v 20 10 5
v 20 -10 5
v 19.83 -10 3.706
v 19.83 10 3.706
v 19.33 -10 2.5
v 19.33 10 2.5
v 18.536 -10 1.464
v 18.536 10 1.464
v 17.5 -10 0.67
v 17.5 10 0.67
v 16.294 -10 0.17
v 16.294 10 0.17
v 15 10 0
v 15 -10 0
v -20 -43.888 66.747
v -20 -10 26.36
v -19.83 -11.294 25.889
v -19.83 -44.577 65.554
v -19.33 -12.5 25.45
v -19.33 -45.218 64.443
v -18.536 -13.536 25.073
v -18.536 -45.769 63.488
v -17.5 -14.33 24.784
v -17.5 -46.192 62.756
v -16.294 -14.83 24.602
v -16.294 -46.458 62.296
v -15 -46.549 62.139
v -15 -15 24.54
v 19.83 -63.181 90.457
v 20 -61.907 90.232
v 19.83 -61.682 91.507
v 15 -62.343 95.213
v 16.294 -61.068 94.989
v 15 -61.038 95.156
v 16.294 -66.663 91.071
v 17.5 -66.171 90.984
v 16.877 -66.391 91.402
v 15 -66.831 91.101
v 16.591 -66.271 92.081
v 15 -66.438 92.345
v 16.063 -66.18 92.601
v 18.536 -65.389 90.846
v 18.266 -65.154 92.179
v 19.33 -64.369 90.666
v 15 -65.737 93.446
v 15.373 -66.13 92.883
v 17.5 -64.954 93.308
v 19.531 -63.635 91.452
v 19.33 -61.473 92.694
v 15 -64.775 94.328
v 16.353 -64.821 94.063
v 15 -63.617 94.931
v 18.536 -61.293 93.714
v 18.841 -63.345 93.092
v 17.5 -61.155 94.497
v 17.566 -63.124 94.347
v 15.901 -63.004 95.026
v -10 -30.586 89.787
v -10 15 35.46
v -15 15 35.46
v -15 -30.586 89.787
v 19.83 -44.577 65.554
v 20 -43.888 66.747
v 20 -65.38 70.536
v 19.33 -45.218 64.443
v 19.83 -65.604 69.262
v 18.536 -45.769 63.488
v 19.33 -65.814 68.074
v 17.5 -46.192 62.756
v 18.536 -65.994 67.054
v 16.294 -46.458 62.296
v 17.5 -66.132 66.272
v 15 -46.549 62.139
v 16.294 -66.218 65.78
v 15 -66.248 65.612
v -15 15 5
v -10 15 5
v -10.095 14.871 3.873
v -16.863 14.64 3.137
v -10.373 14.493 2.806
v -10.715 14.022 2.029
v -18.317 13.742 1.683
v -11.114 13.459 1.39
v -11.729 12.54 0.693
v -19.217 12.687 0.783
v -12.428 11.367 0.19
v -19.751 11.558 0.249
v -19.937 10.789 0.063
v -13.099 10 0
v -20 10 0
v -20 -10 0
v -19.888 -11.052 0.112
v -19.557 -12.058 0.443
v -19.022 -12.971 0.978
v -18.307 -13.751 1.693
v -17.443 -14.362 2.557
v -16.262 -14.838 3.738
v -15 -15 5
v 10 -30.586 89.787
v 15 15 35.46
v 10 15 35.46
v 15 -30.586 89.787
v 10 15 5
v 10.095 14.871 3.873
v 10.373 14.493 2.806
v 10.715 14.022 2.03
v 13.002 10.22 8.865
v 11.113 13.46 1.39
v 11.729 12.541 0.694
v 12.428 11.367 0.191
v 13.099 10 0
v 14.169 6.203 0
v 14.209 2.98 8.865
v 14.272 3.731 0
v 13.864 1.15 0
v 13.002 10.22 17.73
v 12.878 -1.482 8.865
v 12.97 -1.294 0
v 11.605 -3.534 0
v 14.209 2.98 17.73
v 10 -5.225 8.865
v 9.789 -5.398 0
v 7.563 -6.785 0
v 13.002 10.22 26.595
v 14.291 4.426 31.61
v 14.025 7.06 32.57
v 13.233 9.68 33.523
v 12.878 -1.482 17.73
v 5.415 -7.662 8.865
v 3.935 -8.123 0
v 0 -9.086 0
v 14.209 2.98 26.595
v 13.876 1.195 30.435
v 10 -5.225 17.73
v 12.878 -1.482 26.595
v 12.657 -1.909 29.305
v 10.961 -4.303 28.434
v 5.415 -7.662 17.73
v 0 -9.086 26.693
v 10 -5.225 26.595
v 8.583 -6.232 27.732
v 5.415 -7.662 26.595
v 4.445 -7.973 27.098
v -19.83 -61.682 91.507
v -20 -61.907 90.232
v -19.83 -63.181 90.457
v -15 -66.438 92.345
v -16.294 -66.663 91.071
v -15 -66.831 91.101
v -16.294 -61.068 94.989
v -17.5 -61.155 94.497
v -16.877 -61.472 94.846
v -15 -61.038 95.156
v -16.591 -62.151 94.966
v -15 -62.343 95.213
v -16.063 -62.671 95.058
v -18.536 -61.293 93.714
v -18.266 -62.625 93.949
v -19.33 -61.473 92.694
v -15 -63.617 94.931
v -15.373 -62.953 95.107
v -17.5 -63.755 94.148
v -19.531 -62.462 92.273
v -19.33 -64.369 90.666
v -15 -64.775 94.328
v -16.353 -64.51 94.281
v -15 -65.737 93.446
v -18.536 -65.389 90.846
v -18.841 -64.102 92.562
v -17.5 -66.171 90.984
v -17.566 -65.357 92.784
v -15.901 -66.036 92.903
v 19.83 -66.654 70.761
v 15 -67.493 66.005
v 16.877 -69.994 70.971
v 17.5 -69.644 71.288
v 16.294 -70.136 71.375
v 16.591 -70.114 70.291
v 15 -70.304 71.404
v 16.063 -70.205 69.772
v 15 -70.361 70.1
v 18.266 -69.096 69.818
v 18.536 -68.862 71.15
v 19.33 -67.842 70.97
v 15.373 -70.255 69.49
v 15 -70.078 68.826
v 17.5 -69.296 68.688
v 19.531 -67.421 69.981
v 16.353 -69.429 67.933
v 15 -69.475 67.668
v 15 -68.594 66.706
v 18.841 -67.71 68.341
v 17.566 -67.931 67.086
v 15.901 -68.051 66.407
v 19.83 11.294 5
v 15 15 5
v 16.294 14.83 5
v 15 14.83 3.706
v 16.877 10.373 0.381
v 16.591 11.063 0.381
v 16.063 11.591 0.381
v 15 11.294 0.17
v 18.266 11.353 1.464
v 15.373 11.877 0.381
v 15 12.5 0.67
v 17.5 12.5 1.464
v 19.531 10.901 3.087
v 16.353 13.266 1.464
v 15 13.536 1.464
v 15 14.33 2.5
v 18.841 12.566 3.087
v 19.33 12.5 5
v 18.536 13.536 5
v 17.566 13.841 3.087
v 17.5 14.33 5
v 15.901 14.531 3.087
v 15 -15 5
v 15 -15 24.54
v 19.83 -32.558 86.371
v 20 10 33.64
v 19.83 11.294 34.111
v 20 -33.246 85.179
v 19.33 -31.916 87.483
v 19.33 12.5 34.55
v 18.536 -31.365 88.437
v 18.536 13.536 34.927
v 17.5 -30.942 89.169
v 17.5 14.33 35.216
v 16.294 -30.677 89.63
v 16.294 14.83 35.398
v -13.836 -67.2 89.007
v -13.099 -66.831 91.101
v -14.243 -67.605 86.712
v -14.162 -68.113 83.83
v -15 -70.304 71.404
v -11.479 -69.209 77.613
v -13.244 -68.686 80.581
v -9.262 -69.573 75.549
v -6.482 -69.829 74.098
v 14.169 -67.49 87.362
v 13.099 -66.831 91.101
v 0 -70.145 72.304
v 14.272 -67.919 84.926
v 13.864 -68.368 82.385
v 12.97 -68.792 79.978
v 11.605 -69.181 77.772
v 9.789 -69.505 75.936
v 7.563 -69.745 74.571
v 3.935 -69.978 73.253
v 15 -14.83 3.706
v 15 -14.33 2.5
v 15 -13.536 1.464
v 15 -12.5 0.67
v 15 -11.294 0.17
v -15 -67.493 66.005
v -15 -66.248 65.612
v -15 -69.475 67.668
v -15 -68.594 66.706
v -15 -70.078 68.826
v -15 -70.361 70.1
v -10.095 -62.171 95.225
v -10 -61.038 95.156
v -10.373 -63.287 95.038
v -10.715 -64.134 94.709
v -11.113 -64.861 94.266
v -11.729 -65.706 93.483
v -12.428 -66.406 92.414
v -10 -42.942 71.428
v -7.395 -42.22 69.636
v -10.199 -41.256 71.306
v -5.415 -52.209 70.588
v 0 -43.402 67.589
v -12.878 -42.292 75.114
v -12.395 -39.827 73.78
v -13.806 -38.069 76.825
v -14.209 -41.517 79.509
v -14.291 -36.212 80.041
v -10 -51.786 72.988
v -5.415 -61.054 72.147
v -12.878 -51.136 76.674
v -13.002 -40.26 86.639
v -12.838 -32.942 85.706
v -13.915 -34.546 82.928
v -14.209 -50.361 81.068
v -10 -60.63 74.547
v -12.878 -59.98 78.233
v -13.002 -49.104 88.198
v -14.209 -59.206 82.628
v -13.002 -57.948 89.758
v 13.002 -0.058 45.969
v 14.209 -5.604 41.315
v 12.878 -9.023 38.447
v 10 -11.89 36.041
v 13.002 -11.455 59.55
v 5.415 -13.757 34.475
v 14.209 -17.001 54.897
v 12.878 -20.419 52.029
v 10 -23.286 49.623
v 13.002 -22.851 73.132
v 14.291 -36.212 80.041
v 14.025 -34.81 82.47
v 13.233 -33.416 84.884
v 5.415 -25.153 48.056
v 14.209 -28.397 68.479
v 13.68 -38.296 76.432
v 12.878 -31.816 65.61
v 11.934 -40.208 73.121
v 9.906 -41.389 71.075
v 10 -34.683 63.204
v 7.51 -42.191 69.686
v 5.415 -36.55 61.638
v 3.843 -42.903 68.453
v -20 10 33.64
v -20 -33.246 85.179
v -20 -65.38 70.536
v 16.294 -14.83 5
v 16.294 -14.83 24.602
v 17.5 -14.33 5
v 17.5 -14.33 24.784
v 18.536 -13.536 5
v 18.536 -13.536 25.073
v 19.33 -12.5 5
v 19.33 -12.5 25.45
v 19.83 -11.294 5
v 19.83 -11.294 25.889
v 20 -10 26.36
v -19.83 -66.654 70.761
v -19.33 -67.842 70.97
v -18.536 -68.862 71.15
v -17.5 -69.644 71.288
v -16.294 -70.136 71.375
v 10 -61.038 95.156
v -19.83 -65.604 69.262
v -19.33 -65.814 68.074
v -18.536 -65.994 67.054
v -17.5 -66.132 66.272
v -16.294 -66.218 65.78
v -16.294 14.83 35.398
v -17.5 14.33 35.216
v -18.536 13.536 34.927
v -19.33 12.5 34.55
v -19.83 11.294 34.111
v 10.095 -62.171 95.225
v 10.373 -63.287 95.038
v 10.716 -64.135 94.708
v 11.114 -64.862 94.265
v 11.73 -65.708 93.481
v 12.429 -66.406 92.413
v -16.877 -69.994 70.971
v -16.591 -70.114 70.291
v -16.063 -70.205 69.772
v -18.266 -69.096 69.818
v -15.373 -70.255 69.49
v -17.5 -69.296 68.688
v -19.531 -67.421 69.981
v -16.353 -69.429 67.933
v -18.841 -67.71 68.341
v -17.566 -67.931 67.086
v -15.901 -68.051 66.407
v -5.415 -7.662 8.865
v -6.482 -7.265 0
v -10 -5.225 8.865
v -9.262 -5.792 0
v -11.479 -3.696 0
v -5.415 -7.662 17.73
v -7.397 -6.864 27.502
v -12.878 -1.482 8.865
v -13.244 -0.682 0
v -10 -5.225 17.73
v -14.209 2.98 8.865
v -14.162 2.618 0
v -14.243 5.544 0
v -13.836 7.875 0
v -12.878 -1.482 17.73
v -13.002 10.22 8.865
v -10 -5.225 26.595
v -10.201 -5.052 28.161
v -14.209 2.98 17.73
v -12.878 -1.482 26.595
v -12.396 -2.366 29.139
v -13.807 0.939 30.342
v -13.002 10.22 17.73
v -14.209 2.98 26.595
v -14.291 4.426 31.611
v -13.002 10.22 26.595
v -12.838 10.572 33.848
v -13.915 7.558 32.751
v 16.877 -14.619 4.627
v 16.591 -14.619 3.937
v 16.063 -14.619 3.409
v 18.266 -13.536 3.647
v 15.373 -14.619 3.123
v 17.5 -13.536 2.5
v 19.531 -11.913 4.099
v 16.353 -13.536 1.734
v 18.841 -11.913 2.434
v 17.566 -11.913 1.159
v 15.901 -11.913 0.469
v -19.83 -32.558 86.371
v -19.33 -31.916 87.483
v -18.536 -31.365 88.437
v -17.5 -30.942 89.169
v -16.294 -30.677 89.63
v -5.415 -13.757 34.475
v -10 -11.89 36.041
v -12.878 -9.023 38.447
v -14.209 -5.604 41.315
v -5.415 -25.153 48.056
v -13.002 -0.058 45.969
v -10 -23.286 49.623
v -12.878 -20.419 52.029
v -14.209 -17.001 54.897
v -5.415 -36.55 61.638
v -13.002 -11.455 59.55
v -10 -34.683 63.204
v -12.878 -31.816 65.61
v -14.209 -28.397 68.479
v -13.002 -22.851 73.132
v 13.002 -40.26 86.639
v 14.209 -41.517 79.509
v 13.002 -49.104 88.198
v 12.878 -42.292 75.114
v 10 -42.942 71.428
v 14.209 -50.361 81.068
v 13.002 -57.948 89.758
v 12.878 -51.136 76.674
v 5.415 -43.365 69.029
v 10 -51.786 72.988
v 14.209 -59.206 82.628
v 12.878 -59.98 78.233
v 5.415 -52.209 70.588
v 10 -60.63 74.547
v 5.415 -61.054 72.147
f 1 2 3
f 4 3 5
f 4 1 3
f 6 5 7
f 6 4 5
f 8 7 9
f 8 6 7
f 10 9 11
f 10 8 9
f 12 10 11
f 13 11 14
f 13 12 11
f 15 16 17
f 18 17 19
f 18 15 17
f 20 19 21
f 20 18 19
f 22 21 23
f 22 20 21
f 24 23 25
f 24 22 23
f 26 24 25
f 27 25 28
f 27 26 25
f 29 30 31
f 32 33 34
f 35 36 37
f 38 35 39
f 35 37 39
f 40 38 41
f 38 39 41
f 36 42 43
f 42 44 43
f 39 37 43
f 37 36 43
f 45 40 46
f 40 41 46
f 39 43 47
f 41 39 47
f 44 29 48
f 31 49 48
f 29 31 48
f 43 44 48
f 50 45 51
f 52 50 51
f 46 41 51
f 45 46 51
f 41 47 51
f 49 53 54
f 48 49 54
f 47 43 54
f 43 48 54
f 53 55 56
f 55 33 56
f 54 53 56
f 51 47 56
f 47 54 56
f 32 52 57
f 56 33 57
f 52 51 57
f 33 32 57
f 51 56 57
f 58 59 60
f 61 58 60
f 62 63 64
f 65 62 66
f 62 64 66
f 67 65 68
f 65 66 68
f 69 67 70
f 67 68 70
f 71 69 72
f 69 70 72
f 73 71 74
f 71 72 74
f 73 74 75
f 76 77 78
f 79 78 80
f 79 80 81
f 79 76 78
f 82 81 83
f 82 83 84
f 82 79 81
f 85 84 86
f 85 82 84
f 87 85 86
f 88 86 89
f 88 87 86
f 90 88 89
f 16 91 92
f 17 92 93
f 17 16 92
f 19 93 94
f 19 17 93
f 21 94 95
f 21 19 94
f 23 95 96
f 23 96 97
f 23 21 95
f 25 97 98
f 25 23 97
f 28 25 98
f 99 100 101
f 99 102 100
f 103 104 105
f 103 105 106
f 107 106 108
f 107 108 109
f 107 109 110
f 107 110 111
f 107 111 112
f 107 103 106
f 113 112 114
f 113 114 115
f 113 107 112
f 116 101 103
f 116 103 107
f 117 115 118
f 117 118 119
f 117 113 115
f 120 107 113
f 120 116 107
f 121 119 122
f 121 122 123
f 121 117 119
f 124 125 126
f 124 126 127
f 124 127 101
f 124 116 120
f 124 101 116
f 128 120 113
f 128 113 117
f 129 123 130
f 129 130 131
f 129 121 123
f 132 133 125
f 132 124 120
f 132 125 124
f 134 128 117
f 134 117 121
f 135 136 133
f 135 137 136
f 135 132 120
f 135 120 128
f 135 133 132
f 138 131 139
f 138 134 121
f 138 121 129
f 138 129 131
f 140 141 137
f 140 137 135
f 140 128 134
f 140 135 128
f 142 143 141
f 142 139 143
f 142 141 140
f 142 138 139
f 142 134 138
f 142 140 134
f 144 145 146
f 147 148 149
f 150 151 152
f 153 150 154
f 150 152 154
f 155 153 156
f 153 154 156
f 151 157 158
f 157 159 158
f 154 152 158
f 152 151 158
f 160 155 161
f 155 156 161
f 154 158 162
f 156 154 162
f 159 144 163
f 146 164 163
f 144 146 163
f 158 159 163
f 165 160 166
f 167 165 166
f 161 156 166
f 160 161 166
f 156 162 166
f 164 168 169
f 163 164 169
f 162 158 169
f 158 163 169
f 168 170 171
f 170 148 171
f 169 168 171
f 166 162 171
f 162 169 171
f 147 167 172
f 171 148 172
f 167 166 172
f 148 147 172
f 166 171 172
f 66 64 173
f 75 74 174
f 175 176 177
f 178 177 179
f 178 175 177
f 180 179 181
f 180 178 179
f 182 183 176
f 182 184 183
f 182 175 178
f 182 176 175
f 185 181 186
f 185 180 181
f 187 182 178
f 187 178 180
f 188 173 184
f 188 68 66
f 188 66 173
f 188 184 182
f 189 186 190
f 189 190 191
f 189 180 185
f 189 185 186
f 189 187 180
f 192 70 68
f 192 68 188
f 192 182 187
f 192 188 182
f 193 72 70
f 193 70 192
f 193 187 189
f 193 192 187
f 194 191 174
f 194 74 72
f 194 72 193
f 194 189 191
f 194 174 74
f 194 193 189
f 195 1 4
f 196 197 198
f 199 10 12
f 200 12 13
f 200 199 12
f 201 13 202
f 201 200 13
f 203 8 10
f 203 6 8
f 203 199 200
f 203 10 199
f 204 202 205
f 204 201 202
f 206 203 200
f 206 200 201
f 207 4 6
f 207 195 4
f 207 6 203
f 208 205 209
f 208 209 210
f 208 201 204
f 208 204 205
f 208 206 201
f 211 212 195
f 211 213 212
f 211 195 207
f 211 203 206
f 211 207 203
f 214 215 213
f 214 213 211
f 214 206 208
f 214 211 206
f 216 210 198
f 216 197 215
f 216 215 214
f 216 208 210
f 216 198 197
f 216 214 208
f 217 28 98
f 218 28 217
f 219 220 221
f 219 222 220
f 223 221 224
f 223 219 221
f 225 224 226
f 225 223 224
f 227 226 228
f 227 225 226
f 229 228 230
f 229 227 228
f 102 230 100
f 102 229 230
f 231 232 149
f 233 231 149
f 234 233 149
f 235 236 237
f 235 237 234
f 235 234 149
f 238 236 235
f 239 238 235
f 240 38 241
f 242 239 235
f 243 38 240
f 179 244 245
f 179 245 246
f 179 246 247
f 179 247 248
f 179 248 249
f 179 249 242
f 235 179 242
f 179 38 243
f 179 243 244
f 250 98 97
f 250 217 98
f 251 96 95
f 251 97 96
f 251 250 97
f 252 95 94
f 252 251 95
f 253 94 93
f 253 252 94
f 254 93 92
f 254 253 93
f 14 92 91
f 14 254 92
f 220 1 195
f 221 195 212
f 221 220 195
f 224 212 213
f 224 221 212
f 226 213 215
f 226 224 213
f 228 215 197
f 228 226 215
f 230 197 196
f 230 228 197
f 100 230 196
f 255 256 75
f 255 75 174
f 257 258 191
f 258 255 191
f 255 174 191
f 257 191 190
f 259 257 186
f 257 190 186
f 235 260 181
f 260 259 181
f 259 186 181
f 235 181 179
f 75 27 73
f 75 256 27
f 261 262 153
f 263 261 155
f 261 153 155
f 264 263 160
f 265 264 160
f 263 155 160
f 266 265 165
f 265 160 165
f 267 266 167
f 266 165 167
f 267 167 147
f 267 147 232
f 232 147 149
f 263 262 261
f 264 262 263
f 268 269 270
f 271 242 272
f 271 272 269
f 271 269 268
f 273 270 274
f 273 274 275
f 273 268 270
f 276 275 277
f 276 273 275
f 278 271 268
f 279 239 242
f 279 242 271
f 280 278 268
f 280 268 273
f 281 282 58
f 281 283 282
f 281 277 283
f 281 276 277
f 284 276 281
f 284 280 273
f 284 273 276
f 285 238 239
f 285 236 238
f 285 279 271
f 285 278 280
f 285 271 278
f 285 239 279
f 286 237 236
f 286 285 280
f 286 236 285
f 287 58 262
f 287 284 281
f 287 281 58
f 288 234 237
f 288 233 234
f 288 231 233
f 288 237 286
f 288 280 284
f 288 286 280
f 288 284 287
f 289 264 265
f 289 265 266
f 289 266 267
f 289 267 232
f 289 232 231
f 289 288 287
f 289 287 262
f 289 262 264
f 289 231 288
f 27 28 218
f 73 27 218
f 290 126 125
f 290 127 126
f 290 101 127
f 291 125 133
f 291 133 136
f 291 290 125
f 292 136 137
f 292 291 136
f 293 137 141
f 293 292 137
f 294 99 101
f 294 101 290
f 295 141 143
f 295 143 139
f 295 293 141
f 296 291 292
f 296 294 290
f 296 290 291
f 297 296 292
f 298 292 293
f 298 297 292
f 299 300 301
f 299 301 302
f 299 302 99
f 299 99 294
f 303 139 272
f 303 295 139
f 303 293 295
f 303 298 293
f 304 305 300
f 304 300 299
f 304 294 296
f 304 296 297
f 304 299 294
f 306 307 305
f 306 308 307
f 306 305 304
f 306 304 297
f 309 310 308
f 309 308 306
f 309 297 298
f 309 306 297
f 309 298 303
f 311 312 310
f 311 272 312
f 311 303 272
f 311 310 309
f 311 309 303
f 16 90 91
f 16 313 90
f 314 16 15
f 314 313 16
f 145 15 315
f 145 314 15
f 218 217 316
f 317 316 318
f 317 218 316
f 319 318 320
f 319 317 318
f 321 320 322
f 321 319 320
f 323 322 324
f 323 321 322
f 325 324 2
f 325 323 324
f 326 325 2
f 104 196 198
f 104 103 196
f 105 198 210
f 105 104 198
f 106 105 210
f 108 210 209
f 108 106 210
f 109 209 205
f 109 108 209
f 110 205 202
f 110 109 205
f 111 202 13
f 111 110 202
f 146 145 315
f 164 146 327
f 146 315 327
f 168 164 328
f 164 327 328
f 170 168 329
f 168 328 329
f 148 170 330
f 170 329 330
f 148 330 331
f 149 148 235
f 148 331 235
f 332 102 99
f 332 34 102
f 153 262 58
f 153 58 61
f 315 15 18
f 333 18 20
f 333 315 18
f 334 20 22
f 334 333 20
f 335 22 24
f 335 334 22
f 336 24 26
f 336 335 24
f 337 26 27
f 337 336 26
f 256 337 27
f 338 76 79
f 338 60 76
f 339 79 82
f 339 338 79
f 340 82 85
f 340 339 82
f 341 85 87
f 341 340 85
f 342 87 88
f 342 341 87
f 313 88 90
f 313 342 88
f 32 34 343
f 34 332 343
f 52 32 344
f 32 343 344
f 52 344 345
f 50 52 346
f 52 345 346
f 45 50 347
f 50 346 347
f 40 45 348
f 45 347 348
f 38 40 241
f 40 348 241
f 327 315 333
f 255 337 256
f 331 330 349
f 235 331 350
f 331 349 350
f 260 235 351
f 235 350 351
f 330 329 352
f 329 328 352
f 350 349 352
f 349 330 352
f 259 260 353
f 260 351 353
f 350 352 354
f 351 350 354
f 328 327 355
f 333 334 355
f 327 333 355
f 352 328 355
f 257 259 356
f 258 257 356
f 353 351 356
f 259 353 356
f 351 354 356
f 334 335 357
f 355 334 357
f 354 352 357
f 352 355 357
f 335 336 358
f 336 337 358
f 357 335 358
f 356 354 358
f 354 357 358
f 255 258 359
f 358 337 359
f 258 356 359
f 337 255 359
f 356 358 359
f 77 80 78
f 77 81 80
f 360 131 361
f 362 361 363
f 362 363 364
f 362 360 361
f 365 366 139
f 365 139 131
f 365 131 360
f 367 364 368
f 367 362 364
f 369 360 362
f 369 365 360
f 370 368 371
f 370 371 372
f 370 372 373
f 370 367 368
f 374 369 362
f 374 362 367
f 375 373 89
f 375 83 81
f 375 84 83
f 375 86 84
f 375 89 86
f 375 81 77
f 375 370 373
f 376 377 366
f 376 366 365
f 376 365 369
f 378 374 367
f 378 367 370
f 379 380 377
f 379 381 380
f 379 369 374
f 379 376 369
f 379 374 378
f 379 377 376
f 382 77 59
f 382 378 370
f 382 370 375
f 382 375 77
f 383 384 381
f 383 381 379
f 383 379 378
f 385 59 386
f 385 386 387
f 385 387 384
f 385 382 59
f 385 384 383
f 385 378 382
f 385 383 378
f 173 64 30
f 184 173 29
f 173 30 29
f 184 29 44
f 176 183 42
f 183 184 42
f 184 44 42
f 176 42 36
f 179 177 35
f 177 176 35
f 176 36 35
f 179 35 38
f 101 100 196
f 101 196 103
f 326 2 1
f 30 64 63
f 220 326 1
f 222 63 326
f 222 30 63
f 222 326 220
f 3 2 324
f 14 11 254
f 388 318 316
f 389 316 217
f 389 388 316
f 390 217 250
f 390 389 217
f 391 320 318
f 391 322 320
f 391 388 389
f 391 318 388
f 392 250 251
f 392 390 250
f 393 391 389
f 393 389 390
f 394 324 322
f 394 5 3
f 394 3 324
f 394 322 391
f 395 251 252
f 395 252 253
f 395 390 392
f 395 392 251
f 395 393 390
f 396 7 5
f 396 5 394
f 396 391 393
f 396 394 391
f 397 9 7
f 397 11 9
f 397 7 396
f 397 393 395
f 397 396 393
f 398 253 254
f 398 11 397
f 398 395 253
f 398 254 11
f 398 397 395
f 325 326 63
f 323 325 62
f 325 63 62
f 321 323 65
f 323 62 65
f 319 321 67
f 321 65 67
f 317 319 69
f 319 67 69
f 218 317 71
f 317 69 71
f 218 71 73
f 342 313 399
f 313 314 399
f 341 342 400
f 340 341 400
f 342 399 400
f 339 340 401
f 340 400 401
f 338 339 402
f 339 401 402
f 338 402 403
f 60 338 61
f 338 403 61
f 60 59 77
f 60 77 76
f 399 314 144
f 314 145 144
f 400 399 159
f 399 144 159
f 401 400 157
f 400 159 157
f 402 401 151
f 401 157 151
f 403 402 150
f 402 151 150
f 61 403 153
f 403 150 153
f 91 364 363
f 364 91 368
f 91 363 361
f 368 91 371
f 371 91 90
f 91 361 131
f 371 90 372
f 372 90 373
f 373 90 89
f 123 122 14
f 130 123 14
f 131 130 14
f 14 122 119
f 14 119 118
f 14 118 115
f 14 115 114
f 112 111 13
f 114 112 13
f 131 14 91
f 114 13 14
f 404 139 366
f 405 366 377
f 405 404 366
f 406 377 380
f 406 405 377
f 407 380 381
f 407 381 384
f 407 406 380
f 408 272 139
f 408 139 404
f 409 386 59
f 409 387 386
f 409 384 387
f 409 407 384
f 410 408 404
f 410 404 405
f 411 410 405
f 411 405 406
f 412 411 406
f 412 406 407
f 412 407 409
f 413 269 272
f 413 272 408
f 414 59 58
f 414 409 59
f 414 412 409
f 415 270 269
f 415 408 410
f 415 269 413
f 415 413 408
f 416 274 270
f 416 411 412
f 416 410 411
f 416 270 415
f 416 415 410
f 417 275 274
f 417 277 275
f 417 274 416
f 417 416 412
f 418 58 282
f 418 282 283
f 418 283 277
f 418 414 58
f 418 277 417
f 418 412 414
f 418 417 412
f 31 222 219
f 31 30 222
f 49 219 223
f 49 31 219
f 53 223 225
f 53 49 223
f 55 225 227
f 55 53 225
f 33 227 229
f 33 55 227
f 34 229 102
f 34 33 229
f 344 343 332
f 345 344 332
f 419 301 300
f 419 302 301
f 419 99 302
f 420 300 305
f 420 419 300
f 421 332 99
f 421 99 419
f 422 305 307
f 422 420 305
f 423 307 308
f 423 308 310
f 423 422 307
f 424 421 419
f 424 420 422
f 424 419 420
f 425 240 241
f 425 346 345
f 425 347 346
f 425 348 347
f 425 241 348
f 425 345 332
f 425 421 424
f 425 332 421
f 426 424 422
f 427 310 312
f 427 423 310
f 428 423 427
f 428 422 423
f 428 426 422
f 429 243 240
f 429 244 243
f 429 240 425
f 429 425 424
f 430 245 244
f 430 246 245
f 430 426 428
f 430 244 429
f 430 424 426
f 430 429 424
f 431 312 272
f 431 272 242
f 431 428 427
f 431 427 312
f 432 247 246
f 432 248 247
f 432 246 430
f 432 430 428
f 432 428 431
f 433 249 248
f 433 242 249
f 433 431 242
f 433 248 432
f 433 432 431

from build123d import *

# Parameters (mm, degrees)
F3_R = 5


with BuildPart() as f2:
    # F2: sweep along a path in F1
    with BuildLine(Plane.YZ) as f2_path:
        Line((0, 0), (0, 30))
        Line((0, 30), (-38.5672565812, 75.9626665871))
        Line((-38.5672565812, 75.9626665871), (-68.5672565812, 81.2524760084))
    # F0 (on Top) → F2 (sweep)
    with BuildSketch(Plane.XY):
        with BuildLine():
            Line((-10, 15), (-20, 15))
            Line((-20, 15), (-20, -15))
            Line((-20, -15), (20, -15))
            Line((20, -15), (20, 15))
            Line((20, 15), (10, 15))
            add(Edge.make_bspline(
                [(10, 15), (11.0915185913, 13.5177812127), (13.4276997431, 10.3453830316), (15.1647077967, 2.8381597184), (10.8372280842, -6.6356174494), (3.701873231, -8.2492537512), (0, -9.0864198282)],
                knots=[0, 0, 0, 0, 0.2084843189, 0.4462197347, 0.7126948299, 1, 1, 1, 1], degree=3))
            add(Edge.make_bspline(
                [(-10, 15), (-11.0915185913, 13.5177812127), (-13.4276997431, 10.3453830316), (-15.1647077967, 2.8381597184), (-10.8372280842, -6.6356174494), (-3.701873231, -8.2492537512), (0, -9.0864198282)],
                knots=[0, 0, 0, 0, 0.2084843189, 0.4462197347, 0.7126948299, 1, 1, 1, 1], degree=3))
        make_face()
    sweep(path=f2_path.line, transition=Transition.RIGHT)

    # F3
    f3_edges = [f2.edges().sort_by_distance(p)[0] for p in [
        (-20, -7.792962, 62.623147),
        (-20, 15, 17.729777),
        (-20, -15, 12.270223),
        (-20, -30.774295, 43.339519),
        (-20, -58.860285, 64.309476),
        (-20, -68.567257, 81.252476),
        (-20, -48.274229, 92.905667),
        (20, -7.792962, 62.623147),
        (20, 15, 17.729777),
        (20, -48.274229, 92.905667),
        (20, 0, 0),
        (20, -15, 12.270223),
        (20, -30.774295, 43.339519),
        (20, -58.860285, 64.309476),
        (20, -68.567257, 81.252476),
        (15, -65.962534, 96.024592),
        (-15, -65.962534, 96.024592),
        (0, -71.171979, 66.48036),
        (0, -15, 0),
        (-15, 15, 0),
        (15, 15, 0),
    ]]
    fillet(f3_edges, radius=F3_R)


solid = f2.part
